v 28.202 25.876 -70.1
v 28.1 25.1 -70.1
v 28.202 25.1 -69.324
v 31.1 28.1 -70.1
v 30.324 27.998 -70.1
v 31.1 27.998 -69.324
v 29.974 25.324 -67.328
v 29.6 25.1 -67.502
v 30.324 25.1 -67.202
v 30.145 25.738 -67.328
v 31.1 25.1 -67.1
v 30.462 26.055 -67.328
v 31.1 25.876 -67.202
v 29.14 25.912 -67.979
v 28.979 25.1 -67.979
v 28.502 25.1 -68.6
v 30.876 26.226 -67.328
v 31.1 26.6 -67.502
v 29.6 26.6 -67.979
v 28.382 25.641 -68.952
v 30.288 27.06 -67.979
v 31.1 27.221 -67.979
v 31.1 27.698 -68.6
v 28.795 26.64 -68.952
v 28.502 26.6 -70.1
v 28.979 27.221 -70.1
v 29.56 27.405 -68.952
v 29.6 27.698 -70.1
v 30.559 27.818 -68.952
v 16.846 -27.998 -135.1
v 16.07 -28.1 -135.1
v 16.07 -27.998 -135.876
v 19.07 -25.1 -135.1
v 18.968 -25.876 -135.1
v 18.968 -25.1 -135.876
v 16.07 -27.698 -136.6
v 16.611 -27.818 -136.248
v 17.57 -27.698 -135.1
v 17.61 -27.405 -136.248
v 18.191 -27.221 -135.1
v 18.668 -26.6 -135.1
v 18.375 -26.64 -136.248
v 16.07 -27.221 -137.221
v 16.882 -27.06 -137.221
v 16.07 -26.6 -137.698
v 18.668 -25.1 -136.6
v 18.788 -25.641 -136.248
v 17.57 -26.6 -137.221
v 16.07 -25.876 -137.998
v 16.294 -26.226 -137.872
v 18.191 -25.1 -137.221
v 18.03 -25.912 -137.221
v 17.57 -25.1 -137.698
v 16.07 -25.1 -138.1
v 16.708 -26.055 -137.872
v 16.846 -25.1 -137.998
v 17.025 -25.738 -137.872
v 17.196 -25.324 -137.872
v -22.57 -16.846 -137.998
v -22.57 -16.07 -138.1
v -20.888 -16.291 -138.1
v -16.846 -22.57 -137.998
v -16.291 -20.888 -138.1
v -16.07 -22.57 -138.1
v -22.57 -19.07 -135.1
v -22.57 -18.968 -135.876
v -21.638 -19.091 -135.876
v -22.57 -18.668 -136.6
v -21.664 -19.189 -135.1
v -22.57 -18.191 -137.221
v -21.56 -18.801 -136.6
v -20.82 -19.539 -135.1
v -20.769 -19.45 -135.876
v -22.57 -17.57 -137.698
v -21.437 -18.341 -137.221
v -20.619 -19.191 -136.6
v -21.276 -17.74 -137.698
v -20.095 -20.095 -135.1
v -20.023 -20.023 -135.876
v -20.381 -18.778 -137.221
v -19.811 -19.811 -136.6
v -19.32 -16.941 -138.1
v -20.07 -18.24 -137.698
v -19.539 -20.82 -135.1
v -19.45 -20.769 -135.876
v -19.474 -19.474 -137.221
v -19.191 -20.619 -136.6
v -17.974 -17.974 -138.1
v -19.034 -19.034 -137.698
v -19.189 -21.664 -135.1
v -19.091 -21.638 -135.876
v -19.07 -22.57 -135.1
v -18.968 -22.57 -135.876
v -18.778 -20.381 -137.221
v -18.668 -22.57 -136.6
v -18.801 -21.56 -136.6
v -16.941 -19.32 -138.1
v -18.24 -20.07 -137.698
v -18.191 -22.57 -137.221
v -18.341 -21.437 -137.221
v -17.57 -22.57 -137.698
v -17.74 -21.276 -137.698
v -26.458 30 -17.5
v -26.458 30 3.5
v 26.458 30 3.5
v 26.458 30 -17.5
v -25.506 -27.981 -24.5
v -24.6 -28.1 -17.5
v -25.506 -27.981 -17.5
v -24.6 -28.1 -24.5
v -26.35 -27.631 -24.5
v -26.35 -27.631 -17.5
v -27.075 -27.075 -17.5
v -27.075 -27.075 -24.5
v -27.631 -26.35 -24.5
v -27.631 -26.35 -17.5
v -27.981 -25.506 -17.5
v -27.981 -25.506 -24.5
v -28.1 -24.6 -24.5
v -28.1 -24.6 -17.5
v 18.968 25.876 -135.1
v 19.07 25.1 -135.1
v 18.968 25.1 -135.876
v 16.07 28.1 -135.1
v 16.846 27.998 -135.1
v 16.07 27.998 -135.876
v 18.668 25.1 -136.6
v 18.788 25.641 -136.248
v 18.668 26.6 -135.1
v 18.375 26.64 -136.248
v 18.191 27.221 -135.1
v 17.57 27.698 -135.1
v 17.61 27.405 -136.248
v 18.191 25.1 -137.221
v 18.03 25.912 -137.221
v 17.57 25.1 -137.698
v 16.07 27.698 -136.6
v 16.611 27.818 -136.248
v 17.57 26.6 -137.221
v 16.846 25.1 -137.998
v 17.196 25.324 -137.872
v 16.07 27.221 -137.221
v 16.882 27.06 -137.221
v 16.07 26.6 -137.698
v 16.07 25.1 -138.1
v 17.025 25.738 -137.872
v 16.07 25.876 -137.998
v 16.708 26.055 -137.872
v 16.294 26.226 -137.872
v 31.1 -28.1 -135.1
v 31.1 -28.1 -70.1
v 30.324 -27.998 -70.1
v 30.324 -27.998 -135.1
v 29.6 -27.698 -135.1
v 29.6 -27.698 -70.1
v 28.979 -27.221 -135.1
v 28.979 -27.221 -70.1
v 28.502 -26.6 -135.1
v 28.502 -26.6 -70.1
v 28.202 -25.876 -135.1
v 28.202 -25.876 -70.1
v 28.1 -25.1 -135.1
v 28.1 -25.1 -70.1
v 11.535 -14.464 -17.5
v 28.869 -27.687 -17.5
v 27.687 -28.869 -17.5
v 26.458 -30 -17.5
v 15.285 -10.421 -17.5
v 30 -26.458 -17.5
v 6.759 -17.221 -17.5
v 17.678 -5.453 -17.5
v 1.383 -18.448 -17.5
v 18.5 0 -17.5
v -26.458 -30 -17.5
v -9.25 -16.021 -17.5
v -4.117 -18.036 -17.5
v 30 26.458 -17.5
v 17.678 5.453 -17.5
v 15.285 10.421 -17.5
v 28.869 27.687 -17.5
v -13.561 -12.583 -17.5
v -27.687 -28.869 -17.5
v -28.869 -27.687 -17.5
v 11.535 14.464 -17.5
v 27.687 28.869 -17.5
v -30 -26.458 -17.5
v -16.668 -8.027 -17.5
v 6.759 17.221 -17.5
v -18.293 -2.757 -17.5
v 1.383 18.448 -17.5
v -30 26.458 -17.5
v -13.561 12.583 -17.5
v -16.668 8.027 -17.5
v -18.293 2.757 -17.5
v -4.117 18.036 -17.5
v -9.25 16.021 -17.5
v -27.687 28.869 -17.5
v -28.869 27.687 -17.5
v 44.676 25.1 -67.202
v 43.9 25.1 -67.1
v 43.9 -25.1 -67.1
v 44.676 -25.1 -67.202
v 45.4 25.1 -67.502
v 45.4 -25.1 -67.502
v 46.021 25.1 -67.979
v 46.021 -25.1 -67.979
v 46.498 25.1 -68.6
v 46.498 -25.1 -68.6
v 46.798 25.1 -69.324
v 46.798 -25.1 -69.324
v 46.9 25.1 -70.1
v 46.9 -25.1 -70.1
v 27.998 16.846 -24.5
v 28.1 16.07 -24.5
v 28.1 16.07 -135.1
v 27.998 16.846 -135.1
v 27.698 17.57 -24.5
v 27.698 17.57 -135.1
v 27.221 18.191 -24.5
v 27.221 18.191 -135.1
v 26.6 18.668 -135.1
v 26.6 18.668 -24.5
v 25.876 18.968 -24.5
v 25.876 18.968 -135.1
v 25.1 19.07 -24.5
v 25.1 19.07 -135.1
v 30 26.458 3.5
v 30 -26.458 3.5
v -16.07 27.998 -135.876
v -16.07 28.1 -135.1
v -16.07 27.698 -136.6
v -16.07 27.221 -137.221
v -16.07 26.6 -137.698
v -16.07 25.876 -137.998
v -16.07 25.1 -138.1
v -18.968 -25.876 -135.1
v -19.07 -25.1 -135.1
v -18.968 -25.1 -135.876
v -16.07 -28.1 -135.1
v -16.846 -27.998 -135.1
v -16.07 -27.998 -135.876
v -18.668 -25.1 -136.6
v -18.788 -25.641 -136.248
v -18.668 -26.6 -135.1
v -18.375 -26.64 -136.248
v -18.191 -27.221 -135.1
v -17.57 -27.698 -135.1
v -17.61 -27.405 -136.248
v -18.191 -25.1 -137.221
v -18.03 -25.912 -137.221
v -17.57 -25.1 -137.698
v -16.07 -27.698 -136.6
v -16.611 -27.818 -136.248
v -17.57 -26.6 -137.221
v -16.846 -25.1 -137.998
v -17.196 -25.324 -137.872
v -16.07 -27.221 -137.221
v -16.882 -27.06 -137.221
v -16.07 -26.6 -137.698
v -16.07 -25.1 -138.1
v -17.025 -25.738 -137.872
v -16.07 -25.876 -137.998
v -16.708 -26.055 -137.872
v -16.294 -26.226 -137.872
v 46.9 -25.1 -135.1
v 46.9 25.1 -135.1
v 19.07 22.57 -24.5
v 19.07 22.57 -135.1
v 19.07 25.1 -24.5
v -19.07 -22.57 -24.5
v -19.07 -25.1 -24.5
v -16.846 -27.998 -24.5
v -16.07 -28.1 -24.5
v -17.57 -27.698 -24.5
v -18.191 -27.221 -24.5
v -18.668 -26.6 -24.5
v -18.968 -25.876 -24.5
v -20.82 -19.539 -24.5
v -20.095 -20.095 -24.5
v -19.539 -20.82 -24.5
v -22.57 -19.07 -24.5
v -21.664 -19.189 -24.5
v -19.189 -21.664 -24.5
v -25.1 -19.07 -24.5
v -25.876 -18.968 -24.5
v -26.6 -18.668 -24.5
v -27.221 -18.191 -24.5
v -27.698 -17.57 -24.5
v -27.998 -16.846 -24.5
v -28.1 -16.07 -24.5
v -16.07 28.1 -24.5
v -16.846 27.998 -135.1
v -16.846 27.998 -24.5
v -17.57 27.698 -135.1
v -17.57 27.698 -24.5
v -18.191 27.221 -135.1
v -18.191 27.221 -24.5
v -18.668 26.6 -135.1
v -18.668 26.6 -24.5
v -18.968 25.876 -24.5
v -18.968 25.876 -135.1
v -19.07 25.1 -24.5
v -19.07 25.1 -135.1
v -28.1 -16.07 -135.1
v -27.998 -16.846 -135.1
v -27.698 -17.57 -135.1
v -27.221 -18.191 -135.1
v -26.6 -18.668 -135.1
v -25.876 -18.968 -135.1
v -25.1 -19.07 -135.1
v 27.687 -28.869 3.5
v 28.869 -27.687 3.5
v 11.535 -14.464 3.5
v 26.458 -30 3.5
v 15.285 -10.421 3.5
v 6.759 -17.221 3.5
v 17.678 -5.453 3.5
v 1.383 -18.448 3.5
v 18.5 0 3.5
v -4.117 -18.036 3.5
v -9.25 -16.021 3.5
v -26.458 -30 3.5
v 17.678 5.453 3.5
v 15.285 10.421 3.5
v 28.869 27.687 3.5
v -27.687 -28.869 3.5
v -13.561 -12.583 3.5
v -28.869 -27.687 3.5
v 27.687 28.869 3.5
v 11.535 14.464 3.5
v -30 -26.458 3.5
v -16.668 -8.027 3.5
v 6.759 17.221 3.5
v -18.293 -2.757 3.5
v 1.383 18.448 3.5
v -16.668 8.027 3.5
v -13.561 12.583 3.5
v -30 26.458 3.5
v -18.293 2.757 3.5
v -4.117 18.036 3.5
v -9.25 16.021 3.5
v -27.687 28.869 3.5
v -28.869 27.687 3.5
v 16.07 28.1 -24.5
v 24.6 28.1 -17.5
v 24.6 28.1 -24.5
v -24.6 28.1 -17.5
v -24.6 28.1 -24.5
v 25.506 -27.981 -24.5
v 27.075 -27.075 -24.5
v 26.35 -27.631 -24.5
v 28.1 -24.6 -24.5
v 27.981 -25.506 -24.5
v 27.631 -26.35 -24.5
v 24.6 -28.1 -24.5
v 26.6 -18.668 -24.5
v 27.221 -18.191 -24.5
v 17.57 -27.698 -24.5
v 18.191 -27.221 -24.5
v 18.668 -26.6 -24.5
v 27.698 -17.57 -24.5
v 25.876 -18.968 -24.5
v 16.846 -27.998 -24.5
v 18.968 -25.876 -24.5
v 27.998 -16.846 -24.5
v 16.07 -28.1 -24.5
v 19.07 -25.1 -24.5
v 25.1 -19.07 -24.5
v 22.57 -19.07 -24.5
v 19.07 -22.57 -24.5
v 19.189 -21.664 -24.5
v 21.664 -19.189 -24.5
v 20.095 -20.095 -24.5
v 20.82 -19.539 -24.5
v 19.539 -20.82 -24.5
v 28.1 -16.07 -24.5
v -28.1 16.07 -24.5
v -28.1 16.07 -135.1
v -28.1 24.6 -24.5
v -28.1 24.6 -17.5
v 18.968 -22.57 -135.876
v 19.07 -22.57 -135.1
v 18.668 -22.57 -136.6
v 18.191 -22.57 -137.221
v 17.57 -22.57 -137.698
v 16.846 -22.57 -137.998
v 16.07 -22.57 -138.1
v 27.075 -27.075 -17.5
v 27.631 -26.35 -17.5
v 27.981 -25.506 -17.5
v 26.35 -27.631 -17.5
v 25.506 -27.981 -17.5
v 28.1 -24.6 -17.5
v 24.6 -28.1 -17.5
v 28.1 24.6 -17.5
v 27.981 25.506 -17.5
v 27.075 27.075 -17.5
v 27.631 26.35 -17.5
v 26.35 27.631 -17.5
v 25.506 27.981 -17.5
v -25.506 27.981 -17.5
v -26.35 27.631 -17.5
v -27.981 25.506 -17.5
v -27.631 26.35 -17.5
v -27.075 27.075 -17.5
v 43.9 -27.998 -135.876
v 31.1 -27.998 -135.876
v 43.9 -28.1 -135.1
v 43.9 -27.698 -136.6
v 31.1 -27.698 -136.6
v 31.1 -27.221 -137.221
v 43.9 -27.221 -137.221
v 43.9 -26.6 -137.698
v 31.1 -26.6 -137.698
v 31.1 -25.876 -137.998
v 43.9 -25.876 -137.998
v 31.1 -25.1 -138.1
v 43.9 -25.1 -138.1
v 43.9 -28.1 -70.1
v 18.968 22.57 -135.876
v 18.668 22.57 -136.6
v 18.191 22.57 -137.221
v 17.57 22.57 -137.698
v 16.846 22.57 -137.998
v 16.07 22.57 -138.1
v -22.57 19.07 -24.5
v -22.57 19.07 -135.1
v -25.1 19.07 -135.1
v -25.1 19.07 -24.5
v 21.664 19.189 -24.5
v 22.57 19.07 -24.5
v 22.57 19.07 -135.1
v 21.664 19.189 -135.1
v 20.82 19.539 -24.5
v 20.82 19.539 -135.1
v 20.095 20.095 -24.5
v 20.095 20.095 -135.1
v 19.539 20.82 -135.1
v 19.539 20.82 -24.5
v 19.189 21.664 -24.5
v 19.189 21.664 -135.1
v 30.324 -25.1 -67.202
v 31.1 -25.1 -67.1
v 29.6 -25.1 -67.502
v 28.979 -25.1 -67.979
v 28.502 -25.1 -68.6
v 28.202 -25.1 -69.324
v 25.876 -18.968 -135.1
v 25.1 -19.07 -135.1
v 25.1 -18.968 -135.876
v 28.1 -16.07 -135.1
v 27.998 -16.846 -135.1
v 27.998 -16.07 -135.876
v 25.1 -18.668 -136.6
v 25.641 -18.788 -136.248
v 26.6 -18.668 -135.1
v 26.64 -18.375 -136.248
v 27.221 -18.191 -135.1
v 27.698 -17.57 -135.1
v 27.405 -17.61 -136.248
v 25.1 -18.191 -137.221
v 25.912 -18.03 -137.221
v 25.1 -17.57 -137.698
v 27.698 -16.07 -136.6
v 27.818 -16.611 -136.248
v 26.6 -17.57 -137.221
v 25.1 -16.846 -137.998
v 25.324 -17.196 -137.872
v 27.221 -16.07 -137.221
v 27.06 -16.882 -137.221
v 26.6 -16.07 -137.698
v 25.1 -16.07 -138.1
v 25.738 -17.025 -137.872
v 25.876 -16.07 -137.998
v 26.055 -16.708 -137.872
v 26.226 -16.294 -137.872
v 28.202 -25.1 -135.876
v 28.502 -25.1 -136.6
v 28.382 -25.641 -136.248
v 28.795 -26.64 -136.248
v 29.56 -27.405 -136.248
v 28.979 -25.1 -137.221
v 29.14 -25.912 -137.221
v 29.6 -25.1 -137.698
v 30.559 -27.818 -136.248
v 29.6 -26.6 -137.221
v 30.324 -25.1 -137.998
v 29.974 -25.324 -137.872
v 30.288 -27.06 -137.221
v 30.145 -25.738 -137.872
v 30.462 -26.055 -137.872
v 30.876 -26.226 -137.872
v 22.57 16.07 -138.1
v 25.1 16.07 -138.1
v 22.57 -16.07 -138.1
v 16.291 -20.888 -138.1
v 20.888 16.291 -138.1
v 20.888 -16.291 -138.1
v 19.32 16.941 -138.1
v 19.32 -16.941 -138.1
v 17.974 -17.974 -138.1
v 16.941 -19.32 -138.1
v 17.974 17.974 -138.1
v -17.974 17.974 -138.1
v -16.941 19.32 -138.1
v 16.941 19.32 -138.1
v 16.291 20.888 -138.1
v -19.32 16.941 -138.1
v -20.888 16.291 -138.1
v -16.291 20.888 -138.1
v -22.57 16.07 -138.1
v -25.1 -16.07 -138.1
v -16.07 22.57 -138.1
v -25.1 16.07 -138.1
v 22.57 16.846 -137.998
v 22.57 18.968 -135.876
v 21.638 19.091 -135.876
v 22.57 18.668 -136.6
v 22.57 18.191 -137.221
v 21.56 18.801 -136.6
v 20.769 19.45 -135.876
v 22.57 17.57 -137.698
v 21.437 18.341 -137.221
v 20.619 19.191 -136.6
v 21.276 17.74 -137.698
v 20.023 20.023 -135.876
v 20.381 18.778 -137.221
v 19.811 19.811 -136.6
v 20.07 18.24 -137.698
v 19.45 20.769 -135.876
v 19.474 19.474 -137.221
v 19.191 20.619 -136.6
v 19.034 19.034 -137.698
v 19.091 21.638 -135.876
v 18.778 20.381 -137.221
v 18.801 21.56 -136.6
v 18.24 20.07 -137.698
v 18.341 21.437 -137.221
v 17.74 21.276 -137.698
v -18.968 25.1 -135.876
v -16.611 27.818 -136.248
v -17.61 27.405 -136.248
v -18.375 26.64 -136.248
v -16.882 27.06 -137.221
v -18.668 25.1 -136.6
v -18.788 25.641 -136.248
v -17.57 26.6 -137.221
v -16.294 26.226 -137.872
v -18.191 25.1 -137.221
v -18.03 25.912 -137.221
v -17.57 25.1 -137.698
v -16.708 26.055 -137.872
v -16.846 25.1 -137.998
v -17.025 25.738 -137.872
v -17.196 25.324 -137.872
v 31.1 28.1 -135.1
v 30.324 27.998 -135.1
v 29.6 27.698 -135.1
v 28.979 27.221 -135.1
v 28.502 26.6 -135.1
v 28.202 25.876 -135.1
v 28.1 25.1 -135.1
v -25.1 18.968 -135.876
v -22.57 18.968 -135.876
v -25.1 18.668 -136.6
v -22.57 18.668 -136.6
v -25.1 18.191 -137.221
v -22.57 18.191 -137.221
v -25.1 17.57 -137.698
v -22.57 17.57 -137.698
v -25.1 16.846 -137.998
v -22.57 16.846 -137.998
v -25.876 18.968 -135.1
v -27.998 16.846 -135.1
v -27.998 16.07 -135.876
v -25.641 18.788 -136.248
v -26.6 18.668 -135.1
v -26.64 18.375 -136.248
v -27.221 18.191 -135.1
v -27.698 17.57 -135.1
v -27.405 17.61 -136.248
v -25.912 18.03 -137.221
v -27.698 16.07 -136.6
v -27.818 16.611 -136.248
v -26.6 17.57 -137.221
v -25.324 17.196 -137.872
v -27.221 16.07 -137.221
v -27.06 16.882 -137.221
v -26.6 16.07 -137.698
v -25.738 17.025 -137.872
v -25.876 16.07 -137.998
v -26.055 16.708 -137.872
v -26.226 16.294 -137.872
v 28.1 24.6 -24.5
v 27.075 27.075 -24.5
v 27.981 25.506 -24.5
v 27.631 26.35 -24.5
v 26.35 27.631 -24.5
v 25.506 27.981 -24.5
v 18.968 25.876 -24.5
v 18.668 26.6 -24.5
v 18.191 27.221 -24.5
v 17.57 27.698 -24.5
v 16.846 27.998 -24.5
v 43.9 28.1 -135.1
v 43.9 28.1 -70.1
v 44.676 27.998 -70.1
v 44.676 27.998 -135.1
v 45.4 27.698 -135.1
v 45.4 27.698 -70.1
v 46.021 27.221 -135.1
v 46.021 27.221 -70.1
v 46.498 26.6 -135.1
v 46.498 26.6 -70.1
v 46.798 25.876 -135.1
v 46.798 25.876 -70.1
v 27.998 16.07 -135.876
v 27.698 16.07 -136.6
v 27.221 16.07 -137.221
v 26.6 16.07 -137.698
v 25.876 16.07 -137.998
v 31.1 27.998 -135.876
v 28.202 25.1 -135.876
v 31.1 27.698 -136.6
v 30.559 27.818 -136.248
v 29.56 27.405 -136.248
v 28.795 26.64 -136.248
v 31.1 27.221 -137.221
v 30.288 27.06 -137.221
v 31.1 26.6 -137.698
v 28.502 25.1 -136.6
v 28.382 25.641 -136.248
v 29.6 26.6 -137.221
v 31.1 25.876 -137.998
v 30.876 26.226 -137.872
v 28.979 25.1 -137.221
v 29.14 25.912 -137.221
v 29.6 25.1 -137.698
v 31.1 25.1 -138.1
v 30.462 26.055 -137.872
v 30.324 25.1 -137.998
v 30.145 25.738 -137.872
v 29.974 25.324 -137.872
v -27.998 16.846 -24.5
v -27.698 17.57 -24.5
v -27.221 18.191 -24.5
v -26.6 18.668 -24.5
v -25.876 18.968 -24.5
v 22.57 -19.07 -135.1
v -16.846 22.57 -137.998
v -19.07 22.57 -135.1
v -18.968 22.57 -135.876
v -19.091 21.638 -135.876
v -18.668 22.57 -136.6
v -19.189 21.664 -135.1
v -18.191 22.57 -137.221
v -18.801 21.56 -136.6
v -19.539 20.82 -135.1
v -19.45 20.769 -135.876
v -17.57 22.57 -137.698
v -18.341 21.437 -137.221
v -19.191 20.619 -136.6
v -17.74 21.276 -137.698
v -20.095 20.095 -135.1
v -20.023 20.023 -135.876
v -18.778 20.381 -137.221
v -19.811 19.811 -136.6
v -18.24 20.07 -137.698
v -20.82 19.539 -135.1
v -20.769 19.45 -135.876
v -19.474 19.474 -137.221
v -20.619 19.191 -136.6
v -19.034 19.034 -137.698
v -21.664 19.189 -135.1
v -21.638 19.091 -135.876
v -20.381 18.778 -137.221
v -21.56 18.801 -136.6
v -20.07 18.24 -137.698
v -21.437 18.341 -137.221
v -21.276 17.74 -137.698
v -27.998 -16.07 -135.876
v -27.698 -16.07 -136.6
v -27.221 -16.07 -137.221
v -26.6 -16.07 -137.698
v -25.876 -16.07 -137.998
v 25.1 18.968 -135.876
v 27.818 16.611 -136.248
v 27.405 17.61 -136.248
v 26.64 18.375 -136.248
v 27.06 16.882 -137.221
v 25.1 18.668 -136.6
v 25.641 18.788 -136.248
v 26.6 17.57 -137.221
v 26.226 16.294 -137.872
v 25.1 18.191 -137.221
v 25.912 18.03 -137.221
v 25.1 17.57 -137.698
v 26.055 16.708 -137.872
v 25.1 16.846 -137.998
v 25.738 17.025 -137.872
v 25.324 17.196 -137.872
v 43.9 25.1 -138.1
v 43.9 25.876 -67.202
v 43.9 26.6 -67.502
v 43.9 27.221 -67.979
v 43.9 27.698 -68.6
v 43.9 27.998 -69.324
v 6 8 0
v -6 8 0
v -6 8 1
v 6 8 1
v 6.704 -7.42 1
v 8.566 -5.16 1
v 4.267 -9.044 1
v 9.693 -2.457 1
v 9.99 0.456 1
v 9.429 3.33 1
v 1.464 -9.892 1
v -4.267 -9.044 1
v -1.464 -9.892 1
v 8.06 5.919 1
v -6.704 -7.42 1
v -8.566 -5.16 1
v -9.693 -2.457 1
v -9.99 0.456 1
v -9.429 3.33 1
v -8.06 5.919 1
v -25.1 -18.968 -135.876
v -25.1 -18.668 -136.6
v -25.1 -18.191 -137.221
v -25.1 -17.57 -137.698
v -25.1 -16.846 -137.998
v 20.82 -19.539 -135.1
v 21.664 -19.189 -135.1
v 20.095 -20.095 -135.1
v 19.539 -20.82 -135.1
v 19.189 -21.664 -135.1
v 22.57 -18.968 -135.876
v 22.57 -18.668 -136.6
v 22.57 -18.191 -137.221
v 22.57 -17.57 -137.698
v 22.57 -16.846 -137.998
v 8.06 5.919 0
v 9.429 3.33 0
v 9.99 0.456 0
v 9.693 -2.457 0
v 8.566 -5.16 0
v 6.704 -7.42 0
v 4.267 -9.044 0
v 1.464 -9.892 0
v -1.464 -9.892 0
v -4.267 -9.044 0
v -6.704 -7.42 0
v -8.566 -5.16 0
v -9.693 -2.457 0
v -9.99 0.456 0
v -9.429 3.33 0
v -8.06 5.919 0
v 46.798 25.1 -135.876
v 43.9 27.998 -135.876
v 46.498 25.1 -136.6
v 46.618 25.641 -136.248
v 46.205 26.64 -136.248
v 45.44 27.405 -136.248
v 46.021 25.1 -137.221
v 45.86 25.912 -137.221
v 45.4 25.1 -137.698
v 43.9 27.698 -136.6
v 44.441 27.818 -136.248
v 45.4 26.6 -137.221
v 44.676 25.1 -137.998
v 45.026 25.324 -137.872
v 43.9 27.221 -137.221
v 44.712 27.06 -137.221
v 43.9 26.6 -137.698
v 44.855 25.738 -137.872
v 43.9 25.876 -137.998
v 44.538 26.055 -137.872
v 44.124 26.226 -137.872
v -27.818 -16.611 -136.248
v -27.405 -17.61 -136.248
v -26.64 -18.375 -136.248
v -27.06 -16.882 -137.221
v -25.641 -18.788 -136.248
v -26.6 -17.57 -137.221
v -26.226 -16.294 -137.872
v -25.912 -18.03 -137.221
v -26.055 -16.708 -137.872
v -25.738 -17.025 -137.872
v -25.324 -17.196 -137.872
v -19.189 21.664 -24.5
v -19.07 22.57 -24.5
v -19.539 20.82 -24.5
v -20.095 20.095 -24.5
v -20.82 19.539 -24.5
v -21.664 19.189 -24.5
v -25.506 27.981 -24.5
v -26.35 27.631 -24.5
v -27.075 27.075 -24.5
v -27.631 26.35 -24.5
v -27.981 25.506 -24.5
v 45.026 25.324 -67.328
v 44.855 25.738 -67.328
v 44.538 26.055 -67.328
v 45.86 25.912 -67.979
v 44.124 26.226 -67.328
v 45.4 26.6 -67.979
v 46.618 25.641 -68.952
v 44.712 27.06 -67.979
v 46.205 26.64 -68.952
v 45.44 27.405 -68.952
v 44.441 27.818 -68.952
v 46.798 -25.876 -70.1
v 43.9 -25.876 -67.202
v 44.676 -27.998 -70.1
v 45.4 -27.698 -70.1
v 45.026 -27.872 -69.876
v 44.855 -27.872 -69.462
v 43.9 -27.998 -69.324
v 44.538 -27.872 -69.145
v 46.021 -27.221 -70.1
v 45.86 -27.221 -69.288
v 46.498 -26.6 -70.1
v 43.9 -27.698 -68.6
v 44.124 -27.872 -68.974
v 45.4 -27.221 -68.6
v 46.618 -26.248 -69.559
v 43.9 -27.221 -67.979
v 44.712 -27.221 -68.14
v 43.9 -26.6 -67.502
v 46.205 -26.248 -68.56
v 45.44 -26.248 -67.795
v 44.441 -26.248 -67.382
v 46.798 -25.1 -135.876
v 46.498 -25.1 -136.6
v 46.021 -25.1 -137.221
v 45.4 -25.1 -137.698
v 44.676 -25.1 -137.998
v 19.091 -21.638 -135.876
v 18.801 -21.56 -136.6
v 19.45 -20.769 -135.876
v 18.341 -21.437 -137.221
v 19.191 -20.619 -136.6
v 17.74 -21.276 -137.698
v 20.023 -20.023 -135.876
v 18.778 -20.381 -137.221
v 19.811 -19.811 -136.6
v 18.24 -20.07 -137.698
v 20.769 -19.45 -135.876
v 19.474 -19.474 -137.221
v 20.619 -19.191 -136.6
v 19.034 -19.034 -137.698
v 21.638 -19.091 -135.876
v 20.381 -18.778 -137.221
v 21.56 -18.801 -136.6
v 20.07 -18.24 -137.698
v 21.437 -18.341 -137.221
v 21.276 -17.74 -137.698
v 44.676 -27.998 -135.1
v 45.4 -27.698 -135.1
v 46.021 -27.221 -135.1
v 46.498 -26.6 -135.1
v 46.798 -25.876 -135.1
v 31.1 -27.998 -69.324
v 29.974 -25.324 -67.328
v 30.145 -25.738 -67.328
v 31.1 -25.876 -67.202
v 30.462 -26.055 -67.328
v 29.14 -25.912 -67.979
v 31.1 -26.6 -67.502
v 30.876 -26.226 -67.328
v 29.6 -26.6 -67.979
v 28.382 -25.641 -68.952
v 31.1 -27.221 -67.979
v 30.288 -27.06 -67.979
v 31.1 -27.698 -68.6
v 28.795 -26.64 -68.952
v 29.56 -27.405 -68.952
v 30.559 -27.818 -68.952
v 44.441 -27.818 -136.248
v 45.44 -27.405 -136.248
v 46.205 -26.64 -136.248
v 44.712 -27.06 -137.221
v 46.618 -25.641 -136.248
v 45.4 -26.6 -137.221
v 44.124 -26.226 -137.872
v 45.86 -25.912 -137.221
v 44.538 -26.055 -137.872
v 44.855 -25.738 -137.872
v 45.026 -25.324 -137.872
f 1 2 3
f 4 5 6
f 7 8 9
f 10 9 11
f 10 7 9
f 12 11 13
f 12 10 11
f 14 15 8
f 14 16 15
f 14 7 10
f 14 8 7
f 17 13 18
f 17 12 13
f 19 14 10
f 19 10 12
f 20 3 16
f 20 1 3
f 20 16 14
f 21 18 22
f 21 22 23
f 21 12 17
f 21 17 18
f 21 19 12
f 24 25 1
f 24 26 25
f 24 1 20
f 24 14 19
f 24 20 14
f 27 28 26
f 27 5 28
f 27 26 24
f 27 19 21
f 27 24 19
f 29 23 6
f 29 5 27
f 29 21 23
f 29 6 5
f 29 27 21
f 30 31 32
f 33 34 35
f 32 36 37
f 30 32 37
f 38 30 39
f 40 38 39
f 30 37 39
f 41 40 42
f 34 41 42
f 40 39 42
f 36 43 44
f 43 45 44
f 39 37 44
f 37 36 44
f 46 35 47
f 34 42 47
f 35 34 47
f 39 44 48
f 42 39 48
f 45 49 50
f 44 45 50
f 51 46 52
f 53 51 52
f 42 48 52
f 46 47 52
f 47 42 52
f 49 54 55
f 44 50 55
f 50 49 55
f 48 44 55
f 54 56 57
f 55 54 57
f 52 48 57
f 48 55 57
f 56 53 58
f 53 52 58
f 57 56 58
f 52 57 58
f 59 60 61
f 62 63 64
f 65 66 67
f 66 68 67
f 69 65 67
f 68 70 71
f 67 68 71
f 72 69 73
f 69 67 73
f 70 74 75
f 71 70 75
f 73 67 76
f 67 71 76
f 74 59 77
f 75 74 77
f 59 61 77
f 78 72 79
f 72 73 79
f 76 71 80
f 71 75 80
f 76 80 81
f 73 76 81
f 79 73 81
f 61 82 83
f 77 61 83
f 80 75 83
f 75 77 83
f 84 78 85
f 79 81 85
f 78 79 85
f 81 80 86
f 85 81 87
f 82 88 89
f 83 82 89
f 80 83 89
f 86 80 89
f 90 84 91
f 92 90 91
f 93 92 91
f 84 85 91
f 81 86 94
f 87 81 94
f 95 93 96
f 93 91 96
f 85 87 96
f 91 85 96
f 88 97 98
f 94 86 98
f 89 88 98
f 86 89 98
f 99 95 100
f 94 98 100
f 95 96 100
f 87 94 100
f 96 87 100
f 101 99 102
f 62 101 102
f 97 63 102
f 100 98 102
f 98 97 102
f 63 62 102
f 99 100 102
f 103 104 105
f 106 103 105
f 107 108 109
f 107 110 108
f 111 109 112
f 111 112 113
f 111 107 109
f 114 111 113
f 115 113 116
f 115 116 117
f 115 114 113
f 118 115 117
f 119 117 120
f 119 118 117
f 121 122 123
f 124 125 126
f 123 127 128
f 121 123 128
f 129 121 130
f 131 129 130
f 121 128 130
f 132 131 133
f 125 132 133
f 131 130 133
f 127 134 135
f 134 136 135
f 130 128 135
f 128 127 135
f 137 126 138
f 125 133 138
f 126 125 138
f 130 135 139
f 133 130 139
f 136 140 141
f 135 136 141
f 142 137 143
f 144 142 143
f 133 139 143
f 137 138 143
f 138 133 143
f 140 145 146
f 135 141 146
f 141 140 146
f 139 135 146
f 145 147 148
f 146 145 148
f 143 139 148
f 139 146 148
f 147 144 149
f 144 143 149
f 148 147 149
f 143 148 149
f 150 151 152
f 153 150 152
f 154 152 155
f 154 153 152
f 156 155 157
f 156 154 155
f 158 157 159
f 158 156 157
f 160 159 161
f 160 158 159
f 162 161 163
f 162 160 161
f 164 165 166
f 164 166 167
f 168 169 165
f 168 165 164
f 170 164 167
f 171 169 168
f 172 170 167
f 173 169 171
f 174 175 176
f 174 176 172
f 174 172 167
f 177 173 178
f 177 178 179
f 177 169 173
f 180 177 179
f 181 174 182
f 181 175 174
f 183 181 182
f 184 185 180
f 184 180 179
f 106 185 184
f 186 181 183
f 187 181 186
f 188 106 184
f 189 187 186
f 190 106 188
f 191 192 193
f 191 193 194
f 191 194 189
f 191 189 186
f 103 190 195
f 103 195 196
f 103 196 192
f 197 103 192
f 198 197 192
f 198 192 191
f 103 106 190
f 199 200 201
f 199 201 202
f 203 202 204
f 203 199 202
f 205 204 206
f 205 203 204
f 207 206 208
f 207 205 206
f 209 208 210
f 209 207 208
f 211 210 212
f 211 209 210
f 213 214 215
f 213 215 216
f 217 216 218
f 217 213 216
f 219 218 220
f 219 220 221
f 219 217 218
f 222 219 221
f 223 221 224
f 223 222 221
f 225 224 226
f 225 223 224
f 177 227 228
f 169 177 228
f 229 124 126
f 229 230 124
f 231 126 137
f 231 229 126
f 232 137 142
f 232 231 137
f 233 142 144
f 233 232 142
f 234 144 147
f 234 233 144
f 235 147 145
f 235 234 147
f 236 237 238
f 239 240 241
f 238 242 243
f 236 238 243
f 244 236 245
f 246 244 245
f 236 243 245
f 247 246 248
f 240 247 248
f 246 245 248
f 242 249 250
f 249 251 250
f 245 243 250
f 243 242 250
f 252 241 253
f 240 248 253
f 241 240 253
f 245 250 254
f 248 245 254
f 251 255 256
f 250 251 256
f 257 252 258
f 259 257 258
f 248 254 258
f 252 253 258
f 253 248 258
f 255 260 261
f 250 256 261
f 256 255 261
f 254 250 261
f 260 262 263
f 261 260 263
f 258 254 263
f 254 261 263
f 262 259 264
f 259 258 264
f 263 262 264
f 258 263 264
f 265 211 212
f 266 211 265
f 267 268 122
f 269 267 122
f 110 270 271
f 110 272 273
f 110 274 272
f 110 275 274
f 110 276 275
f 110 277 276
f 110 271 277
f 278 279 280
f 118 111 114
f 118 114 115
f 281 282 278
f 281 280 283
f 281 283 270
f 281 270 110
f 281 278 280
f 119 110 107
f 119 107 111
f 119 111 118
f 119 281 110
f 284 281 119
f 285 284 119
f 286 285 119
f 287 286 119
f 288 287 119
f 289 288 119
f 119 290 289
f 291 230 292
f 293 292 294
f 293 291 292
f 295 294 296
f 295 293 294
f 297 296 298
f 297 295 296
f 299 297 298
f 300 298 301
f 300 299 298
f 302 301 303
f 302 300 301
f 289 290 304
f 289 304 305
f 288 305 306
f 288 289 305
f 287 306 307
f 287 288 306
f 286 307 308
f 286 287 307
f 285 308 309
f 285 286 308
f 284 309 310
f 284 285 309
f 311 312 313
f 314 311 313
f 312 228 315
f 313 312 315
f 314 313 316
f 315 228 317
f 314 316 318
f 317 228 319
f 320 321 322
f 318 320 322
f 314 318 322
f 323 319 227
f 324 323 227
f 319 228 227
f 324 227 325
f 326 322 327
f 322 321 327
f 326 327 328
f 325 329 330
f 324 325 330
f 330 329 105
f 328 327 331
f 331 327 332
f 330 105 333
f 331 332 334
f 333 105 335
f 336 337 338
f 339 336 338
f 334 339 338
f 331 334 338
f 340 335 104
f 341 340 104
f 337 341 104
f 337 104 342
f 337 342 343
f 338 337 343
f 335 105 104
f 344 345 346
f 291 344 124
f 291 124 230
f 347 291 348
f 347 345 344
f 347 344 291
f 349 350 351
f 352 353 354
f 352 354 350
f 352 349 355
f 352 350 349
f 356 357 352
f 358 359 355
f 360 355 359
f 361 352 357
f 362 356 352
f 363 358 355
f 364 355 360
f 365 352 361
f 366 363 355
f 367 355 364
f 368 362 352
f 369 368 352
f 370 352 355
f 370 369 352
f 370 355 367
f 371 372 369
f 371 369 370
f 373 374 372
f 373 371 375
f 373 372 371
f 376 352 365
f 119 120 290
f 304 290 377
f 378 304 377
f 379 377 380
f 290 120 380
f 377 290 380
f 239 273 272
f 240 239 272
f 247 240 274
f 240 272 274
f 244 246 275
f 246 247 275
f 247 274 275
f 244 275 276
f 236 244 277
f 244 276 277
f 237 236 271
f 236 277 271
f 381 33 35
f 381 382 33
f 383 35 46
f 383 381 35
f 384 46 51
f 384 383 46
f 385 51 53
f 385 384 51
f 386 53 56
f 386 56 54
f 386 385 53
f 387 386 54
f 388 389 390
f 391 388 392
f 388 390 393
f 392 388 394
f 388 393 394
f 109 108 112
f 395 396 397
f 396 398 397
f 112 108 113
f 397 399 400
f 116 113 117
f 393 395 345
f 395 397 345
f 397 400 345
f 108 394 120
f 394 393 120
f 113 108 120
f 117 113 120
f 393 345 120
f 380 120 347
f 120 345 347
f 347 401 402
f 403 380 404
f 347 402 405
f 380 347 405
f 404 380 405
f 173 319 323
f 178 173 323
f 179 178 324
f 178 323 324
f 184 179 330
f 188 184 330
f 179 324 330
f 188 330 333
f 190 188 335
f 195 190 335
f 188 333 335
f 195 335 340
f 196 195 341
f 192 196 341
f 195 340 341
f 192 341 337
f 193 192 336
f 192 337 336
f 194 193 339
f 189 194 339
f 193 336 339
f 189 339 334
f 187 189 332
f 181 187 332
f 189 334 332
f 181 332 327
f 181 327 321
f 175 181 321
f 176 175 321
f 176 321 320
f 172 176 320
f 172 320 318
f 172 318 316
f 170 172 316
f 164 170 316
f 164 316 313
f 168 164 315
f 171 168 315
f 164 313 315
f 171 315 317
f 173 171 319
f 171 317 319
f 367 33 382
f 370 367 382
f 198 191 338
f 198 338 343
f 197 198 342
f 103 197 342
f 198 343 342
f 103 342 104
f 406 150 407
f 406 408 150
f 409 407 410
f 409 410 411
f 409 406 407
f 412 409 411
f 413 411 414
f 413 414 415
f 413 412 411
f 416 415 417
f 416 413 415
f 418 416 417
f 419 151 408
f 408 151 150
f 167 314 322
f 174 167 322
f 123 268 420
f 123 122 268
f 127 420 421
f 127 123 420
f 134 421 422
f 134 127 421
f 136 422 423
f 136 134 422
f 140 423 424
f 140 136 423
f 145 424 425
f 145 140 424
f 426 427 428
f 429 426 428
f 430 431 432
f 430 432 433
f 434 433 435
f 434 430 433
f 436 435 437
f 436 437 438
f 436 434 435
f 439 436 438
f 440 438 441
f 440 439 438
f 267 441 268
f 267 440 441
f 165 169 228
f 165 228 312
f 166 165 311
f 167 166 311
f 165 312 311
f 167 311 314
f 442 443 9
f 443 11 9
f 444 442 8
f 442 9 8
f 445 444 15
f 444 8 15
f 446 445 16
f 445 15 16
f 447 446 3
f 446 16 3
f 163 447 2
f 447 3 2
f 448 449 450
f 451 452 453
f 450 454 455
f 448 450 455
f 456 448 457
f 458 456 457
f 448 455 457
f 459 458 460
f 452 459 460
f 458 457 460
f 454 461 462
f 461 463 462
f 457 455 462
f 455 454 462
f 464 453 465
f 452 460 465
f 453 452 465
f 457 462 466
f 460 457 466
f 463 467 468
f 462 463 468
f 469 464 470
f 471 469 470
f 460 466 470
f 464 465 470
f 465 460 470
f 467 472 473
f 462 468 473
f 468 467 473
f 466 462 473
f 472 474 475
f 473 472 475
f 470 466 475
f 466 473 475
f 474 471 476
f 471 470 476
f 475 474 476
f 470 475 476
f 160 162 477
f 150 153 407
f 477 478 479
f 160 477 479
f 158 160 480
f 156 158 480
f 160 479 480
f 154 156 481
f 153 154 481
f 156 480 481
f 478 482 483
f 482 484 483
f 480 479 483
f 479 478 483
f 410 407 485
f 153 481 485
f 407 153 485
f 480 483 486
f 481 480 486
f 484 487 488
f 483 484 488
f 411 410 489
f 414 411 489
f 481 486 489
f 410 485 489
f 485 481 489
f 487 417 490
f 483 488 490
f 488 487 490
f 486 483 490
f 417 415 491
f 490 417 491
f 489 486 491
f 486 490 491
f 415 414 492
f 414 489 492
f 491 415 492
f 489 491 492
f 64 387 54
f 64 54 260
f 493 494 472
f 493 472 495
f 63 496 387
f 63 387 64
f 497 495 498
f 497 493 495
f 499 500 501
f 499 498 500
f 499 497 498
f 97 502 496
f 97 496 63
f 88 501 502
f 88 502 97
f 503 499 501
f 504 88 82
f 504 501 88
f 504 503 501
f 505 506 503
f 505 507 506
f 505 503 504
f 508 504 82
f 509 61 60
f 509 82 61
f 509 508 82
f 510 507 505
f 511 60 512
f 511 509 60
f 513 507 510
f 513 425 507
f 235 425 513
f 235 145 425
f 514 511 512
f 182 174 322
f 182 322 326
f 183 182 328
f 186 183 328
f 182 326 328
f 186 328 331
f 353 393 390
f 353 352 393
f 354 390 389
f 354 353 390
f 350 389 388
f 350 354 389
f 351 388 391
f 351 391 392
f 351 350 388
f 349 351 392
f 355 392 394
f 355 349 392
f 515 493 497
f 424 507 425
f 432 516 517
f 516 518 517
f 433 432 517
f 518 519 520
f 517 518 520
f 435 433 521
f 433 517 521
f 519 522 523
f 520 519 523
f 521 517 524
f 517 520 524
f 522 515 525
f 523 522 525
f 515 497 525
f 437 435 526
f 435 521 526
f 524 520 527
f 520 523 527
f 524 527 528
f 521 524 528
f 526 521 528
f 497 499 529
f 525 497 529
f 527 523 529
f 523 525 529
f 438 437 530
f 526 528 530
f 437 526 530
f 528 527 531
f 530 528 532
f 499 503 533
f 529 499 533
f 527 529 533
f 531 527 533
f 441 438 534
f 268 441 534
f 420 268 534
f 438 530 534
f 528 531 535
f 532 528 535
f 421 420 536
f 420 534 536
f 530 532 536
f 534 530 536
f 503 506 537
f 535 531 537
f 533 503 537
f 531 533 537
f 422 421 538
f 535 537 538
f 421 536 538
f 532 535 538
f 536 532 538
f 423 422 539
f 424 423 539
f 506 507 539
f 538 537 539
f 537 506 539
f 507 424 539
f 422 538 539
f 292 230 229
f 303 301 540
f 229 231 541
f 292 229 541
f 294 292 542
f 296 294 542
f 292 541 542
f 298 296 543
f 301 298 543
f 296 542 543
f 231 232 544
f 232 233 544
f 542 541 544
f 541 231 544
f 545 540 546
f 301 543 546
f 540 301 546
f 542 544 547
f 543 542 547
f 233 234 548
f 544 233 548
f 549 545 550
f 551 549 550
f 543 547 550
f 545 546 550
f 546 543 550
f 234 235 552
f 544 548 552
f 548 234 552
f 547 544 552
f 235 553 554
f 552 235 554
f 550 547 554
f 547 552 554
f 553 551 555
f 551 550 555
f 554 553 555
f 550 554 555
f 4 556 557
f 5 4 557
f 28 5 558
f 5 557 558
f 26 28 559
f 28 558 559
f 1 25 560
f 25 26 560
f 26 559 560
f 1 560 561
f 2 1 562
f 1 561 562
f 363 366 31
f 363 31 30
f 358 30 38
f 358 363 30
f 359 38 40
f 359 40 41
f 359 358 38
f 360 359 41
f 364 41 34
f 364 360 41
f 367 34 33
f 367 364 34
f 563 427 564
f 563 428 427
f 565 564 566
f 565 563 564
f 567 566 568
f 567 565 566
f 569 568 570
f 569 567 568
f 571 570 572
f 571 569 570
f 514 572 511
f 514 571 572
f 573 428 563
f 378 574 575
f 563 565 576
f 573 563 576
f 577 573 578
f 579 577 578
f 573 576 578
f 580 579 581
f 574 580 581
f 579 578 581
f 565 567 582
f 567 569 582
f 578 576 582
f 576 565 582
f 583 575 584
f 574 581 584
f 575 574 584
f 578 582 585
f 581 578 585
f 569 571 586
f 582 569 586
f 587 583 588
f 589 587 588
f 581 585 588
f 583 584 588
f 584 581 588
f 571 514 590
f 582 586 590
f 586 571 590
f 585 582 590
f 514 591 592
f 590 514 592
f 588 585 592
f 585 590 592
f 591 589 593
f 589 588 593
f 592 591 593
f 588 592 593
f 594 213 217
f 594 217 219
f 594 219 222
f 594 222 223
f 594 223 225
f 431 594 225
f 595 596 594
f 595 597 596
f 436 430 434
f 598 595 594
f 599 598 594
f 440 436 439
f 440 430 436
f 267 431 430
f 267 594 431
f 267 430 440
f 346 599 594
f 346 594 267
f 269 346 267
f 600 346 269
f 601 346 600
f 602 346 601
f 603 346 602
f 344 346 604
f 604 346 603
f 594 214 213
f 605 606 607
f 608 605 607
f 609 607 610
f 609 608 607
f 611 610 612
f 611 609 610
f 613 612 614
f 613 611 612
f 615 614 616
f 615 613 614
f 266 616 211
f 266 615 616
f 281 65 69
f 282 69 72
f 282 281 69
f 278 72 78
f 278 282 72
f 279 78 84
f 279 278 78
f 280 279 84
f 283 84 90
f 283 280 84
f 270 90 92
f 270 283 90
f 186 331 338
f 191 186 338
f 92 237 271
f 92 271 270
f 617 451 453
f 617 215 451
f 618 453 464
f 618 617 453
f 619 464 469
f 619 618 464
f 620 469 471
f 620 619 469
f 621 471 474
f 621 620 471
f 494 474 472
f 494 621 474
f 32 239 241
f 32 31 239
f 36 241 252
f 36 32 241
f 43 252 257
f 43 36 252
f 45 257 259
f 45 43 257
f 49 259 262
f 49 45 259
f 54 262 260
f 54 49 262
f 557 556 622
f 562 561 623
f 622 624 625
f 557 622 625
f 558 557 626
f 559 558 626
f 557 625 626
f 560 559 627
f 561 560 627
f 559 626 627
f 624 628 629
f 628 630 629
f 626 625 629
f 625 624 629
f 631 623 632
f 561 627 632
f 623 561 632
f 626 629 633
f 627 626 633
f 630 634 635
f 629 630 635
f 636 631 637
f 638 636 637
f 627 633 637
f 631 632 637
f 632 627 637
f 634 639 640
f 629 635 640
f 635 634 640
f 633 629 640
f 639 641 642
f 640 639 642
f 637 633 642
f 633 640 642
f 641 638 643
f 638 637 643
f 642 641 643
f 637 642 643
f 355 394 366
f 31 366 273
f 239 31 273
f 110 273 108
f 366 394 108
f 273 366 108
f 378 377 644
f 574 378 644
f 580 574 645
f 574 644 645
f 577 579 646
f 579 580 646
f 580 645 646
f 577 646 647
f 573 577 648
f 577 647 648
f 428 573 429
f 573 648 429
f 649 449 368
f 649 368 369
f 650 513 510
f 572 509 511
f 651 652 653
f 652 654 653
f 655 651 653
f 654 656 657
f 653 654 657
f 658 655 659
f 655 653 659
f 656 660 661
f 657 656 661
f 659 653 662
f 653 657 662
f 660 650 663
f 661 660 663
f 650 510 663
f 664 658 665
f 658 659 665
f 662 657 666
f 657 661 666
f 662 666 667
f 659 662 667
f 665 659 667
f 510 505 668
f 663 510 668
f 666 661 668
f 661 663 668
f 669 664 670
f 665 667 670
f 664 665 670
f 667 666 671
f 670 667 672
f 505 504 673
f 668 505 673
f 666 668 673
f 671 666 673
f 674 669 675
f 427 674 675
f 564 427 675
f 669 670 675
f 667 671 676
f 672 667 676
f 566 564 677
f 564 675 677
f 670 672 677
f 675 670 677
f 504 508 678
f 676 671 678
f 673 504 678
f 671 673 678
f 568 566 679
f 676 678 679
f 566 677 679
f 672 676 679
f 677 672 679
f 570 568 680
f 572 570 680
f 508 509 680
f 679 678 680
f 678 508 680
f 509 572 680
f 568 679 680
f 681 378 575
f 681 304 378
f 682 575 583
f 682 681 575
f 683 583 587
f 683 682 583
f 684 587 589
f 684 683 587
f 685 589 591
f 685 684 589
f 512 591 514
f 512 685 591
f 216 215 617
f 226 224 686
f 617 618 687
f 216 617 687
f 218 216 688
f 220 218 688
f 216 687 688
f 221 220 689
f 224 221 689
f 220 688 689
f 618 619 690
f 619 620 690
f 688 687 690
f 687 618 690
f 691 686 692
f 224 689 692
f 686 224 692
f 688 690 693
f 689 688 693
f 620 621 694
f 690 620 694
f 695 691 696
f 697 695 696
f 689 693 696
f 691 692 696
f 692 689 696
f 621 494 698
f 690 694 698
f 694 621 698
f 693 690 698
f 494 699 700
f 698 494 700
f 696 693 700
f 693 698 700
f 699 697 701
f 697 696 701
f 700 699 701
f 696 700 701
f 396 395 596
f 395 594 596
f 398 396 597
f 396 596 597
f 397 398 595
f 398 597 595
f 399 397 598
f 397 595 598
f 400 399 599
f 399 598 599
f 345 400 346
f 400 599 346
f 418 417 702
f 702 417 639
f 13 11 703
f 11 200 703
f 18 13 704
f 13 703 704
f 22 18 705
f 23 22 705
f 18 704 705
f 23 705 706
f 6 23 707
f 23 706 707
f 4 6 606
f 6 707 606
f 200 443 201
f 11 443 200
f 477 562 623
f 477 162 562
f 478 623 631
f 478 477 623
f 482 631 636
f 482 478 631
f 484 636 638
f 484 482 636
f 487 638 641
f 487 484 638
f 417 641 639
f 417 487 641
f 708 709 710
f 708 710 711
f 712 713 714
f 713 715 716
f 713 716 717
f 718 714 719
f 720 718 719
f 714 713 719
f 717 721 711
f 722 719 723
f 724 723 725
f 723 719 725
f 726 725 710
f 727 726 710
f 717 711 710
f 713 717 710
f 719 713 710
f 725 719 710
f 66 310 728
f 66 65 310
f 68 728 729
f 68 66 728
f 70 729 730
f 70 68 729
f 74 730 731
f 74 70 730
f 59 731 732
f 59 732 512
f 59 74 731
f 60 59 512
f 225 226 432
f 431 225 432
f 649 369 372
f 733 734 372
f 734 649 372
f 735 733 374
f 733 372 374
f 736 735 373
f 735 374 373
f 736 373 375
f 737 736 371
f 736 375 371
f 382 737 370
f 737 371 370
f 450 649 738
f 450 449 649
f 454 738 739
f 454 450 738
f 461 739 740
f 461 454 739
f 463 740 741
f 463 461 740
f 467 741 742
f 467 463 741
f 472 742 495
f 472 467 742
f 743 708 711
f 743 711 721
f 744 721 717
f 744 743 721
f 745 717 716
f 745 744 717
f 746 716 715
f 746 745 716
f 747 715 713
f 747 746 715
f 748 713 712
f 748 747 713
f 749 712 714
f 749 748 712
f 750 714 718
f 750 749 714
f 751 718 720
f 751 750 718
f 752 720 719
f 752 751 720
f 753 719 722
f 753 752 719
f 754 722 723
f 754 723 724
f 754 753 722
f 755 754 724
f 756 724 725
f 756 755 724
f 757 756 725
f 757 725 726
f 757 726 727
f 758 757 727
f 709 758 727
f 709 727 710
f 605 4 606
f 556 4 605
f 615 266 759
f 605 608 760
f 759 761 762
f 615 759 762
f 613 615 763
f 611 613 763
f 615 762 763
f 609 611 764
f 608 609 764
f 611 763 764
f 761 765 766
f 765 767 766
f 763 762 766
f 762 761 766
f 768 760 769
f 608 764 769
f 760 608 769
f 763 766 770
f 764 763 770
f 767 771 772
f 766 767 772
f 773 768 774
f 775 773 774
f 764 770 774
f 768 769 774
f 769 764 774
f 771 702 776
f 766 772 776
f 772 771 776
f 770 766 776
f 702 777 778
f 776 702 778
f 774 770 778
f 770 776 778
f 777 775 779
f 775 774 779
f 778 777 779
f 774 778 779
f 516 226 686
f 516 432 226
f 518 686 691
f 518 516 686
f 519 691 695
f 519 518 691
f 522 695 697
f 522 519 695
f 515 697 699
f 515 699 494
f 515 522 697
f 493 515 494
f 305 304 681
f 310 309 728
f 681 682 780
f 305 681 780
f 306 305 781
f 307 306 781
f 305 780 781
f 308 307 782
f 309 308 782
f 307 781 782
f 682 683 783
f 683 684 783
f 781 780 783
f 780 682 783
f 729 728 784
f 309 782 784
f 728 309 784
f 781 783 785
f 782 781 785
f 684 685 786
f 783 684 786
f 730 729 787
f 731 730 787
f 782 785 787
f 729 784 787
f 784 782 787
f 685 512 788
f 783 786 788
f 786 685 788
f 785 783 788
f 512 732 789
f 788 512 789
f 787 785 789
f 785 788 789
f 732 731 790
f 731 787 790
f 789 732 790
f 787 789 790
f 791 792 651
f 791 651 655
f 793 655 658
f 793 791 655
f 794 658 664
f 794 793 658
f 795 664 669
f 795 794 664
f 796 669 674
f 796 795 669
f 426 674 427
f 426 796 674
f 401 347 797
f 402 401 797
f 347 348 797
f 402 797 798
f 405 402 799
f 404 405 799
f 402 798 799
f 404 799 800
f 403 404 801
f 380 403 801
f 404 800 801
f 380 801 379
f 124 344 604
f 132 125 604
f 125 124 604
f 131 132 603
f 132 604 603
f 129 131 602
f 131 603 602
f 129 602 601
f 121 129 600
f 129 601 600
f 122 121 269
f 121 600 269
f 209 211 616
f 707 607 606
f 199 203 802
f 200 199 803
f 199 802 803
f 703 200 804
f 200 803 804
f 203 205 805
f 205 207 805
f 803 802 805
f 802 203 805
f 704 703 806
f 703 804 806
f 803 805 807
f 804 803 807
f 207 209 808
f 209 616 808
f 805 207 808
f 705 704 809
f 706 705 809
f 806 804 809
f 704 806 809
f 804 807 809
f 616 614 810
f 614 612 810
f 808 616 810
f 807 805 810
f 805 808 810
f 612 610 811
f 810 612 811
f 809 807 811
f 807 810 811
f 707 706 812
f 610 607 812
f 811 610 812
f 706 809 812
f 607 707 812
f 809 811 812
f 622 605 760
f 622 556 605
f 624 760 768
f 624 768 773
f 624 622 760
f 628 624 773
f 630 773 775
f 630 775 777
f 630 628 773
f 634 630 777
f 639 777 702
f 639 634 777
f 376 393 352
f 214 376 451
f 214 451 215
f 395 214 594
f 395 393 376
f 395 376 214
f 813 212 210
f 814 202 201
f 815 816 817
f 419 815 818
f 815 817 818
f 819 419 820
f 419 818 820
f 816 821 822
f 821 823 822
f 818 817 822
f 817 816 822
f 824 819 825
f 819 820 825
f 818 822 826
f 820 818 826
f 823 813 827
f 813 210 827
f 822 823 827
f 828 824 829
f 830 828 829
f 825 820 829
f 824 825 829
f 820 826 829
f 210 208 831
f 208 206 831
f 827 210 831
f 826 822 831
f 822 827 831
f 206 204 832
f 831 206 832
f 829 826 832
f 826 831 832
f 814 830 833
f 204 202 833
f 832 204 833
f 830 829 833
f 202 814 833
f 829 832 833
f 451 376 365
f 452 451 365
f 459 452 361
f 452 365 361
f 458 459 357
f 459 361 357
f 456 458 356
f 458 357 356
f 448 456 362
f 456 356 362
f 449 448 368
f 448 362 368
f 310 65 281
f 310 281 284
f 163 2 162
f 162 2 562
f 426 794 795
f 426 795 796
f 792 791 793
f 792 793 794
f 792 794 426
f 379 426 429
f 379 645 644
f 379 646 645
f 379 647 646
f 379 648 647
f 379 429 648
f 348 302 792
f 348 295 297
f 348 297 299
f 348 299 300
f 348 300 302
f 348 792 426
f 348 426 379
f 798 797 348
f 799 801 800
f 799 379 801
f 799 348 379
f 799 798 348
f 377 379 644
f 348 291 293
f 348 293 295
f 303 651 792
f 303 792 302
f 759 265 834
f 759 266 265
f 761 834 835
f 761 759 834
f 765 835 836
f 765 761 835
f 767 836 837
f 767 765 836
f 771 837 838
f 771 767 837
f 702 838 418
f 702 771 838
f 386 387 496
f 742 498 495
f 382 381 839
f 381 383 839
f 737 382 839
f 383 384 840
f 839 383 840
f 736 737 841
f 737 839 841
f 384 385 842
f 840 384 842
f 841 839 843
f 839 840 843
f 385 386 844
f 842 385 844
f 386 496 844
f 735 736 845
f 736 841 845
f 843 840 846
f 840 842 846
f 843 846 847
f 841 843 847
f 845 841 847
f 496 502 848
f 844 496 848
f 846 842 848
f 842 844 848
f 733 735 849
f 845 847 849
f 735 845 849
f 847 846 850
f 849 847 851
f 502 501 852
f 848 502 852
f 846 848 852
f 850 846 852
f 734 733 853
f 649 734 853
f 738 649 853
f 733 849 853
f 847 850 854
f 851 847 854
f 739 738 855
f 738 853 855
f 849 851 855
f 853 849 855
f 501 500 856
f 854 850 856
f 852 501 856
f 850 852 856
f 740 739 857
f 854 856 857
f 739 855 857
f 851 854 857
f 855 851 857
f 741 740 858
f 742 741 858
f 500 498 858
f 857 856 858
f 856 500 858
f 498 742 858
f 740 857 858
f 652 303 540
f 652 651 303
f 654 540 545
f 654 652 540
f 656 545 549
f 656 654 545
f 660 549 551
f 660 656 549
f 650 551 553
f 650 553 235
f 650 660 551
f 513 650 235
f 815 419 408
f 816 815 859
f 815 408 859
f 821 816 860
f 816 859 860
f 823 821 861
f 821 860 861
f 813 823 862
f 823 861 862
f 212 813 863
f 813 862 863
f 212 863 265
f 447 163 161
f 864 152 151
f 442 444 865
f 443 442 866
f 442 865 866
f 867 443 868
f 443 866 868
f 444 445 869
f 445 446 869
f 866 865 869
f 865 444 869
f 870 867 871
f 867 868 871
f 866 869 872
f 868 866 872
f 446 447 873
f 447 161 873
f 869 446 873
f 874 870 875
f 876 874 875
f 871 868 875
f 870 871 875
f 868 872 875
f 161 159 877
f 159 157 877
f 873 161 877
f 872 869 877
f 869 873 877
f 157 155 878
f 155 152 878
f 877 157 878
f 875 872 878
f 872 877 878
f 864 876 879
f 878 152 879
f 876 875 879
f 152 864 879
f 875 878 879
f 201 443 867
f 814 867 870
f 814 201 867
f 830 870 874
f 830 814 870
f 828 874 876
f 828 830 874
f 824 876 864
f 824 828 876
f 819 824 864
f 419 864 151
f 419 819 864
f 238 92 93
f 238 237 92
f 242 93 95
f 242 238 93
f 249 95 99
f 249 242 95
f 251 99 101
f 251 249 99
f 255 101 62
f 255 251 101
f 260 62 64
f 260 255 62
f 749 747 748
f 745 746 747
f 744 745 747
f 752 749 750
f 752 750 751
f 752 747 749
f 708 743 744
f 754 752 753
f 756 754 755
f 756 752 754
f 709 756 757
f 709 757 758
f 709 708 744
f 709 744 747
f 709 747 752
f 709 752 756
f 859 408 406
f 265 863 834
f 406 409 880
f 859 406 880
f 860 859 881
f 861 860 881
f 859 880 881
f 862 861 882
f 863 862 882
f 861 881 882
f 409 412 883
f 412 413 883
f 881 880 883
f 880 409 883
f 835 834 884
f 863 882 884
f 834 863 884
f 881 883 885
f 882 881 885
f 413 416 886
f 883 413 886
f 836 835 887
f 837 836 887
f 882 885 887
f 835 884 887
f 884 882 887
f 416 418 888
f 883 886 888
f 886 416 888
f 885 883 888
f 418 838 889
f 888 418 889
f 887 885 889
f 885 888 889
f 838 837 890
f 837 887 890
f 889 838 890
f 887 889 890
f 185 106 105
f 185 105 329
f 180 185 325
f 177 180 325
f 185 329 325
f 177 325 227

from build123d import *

# Parameters (mm, degrees)
BOSS_EXTRUDE1_DEPTH = 1
BOSS_EXTRUDE2_START = 3.5
SKETCH2_R           = 18.5
BOSS_EXTRUDE2_DEPTH = 21
SKETCH3_W           = 56.2
SKETCH3_H           = 56.2
BOSS_EXTRUDE3_DEPTH = 120.6
SKETCH4_W           = 9.03
SKETCH4_H           = 9.03
CUT_EXTRUDE1_DEPTH  = 113.6
FILLET1_R           = 3.5
FILLET2_R           = 3
FILLET3_R           = 3
SKETCH5_W           = 71
SKETCH5_H           = 56.2
BOSS_EXTRUDE4_DEPTH = 18.8
FILLET5_R           = 3
FILLET7_R           = 3


with BuildPart() as part:
    # Sketch1 → Boss-Extrude1 (new body)
    with BuildSketch(Plane.XY):
        with BuildLine():
            Line((-6, 8), (6, 8))
            ThreePointArc((6, 8), (0, -10), (-6, 8))
        make_face()
    extrude(amount=BOSS_EXTRUDE1_DEPTH)


with BuildPart() as body_2:
    # Sketch2 → Boss-Extrude2 (new body)
    with BuildSketch(Plane.XY.offset(BOSS_EXTRUDE2_START)):
        with BuildLine():
            Line((-26.457513111, 30), (26.457513111, 30))
            ThreePointArc((26.457513111, 30), (28.284271247, 28.284271247), (30, 26.457513111))
            Line((30, 26.457513111), (30, -26.457513111))
            ThreePointArc((30, -26.457513111), (28.284271247, -28.284271247), (26.457513111, -30))
            Line((26.457513111, -30), (-26.457513111, -30))
            ThreePointArc((-26.457513111, -30), (-28.284271247, -28.284271247), (-30, -26.457513111))
            Line((-30, -26.457513111), (-30, 26.457513111))
            ThreePointArc((-30, 26.457513111), (-28.284271247, 28.284271247), (-26.457513111, 30))
        make_face()
        Circle(SKETCH2_R, mode=Mode.SUBTRACT)
    extrude(amount=-BOSS_EXTRUDE2_DEPTH)


with BuildPart() as body_3:
    # Sketch3 → Boss-Extrude3 (new body)
    with BuildSketch(Plane(origin=(0, 0, -17.5), x_dir=(-1, 0, 0), z_dir=(0, 0, -1))):
        Rectangle(SKETCH3_W, SKETCH3_H)
    extrude(amount=BOSS_EXTRUDE3_DEPTH)

    # Sketch4 → Cut-Extrude1 (cut)
    with BuildSketch(Plane(origin=(0, 0, -138.1), x_dir=(-1, 0, 0), z_dir=(0, 0, -1))):
        with Locations((-23.585, 23.585)):
            Rectangle(SKETCH4_W, SKETCH4_H)
        with Locations((23.585, 23.585)):
            Rectangle(SKETCH4_W, SKETCH4_H)
        with Locations((23.585, -23.585)):
            Rectangle(SKETCH4_W, SKETCH4_H)
        with Locations((-23.585, -23.585)):
            Rectangle(SKETCH4_W, SKETCH4_H)
    extrude(amount=-CUT_EXTRUDE1_DEPTH, mode=Mode.SUBTRACT)

    # Fillet1
    fillet1_edges = [body_3.edges().sort_by_distance(p)[0] for p in [
        (28.1, 28.1, -21),
        (19.07, 19.07, -81.3),
        (-28.1, 28.1, -21),
        (-19.07, 19.07, -81.3),
        (-28.1, -28.1, -21),
        (-19.07, -19.07, -81.3),
        (28.1, -28.1, -21),
        (19.07, -19.07, -81.3),
    ]]
    fillet(fillet1_edges, radius=FILLET1_R)

    # Fillet2
    fillet2_edges = [body_3.edges().sort_by_distance(p)[0] for p in [
        (19.07, 28.1, -81.3),
        (28.1, 19.07, -81.3),
        (-19.07, 28.1, -81.3),
        (-28.1, 19.07, -81.3),
        (-19.07, -28.1, -81.3),
        (-28.1, -19.07, -81.3),
        (19.07, -28.1, -81.3),
        (28.1, -19.07, -81.3),
    ]]
    fillet(fillet2_edges, radius=FILLET2_R)

    # Fillet3
    fillet3_edges = [body_3.edges().sort_by_distance(p)[0] for p in [
        (19.07, -23.835, -138.1),
        (0, -28.1, -138.1),
        (-23.835, -19.07, -138.1),
        (-28.1, 0, -138.1),
        (-19.07, 23.835, -138.1),
        (0, 28.1, -138.1),
        (23.835, 19.07, -138.1),
        (28.1, 0, -138.1),
        (-18.191320344, -27.221320344, -138.1),
        (-27.221320344, -18.191320344, -138.1),
        (-27.221320344, 18.191320344, -138.1),
        (-18.191320344, 27.221320344, -138.1),
        (18.191320344, 27.221320344, -138.1),
        (27.221320344, 18.191320344, -138.1),
        (27.221320344, -18.191320344, -138.1),
        (18.191320344, -27.221320344, -138.1),
        (-23.835, 19.07, -138.1),
        (-19.07, -23.835, -138.1),
        (23.835, -19.07, -138.1),
        (19.07, 23.835, -138.1),
        (-20.095126266, 20.095126266, -138.1),
        (-20.095126266, -20.095126266, -138.1),
        (20.095126266, -20.095126266, -138.1),
        (20.095126266, 20.095126266, -138.1),
    ]]
    fillet(fillet3_edges, radius=FILLET3_R)


with BuildPart() as body_4:
    # Sketch5 → Boss-Extrude4 (new body)
    with BuildSketch(Plane(origin=(28.1, 0, 0), x_dir=(0, 0, -1), z_dir=(1, 0, 0))):
        with Locations((102.6, 0)):
            Rectangle(SKETCH5_W, SKETCH5_H)
    extrude(amount=BOSS_EXTRUDE4_DEPTH)

    # Fillet5
    fillet5_edges = [body_4.edges().sort_by_distance(p)[0] for p in [
        (46.9, 28.1, -102.6),
        (46.9, 0, -67.1),
        (28.1, 28.1, -102.6),
        (28.1, -28.1, -102.6),
        (28.1, 0, -67.1),
        (46.9, -28.1, -102.6),
        (37.5, 28.1, -67.1),
        (37.5, -28.1, -67.1),
    ]]
    fillet(fillet5_edges, radius=FILLET5_R)

    # Fillet7
    fillet7_edges = [body_4.edges().sort_by_distance(p)[0] for p in [
        (46.9, 0, -138.1),
        (37.5, 28.1, -138.1),
        (28.1, 0, -138.1),
        (37.5, -28.1, -138.1),
        (46.021320344, -27.221320344, -138.1),
        (28.978679656, -27.221320344, -138.1),
        (28.978679656, 27.221320344, -138.1),
        (46.021320344, 27.221320344, -138.1),
    ]]
    fillet(fillet7_edges, radius=FILLET7_R)


solid = Compound([part.part, body_2.part, body_3.part, body_4.part])
